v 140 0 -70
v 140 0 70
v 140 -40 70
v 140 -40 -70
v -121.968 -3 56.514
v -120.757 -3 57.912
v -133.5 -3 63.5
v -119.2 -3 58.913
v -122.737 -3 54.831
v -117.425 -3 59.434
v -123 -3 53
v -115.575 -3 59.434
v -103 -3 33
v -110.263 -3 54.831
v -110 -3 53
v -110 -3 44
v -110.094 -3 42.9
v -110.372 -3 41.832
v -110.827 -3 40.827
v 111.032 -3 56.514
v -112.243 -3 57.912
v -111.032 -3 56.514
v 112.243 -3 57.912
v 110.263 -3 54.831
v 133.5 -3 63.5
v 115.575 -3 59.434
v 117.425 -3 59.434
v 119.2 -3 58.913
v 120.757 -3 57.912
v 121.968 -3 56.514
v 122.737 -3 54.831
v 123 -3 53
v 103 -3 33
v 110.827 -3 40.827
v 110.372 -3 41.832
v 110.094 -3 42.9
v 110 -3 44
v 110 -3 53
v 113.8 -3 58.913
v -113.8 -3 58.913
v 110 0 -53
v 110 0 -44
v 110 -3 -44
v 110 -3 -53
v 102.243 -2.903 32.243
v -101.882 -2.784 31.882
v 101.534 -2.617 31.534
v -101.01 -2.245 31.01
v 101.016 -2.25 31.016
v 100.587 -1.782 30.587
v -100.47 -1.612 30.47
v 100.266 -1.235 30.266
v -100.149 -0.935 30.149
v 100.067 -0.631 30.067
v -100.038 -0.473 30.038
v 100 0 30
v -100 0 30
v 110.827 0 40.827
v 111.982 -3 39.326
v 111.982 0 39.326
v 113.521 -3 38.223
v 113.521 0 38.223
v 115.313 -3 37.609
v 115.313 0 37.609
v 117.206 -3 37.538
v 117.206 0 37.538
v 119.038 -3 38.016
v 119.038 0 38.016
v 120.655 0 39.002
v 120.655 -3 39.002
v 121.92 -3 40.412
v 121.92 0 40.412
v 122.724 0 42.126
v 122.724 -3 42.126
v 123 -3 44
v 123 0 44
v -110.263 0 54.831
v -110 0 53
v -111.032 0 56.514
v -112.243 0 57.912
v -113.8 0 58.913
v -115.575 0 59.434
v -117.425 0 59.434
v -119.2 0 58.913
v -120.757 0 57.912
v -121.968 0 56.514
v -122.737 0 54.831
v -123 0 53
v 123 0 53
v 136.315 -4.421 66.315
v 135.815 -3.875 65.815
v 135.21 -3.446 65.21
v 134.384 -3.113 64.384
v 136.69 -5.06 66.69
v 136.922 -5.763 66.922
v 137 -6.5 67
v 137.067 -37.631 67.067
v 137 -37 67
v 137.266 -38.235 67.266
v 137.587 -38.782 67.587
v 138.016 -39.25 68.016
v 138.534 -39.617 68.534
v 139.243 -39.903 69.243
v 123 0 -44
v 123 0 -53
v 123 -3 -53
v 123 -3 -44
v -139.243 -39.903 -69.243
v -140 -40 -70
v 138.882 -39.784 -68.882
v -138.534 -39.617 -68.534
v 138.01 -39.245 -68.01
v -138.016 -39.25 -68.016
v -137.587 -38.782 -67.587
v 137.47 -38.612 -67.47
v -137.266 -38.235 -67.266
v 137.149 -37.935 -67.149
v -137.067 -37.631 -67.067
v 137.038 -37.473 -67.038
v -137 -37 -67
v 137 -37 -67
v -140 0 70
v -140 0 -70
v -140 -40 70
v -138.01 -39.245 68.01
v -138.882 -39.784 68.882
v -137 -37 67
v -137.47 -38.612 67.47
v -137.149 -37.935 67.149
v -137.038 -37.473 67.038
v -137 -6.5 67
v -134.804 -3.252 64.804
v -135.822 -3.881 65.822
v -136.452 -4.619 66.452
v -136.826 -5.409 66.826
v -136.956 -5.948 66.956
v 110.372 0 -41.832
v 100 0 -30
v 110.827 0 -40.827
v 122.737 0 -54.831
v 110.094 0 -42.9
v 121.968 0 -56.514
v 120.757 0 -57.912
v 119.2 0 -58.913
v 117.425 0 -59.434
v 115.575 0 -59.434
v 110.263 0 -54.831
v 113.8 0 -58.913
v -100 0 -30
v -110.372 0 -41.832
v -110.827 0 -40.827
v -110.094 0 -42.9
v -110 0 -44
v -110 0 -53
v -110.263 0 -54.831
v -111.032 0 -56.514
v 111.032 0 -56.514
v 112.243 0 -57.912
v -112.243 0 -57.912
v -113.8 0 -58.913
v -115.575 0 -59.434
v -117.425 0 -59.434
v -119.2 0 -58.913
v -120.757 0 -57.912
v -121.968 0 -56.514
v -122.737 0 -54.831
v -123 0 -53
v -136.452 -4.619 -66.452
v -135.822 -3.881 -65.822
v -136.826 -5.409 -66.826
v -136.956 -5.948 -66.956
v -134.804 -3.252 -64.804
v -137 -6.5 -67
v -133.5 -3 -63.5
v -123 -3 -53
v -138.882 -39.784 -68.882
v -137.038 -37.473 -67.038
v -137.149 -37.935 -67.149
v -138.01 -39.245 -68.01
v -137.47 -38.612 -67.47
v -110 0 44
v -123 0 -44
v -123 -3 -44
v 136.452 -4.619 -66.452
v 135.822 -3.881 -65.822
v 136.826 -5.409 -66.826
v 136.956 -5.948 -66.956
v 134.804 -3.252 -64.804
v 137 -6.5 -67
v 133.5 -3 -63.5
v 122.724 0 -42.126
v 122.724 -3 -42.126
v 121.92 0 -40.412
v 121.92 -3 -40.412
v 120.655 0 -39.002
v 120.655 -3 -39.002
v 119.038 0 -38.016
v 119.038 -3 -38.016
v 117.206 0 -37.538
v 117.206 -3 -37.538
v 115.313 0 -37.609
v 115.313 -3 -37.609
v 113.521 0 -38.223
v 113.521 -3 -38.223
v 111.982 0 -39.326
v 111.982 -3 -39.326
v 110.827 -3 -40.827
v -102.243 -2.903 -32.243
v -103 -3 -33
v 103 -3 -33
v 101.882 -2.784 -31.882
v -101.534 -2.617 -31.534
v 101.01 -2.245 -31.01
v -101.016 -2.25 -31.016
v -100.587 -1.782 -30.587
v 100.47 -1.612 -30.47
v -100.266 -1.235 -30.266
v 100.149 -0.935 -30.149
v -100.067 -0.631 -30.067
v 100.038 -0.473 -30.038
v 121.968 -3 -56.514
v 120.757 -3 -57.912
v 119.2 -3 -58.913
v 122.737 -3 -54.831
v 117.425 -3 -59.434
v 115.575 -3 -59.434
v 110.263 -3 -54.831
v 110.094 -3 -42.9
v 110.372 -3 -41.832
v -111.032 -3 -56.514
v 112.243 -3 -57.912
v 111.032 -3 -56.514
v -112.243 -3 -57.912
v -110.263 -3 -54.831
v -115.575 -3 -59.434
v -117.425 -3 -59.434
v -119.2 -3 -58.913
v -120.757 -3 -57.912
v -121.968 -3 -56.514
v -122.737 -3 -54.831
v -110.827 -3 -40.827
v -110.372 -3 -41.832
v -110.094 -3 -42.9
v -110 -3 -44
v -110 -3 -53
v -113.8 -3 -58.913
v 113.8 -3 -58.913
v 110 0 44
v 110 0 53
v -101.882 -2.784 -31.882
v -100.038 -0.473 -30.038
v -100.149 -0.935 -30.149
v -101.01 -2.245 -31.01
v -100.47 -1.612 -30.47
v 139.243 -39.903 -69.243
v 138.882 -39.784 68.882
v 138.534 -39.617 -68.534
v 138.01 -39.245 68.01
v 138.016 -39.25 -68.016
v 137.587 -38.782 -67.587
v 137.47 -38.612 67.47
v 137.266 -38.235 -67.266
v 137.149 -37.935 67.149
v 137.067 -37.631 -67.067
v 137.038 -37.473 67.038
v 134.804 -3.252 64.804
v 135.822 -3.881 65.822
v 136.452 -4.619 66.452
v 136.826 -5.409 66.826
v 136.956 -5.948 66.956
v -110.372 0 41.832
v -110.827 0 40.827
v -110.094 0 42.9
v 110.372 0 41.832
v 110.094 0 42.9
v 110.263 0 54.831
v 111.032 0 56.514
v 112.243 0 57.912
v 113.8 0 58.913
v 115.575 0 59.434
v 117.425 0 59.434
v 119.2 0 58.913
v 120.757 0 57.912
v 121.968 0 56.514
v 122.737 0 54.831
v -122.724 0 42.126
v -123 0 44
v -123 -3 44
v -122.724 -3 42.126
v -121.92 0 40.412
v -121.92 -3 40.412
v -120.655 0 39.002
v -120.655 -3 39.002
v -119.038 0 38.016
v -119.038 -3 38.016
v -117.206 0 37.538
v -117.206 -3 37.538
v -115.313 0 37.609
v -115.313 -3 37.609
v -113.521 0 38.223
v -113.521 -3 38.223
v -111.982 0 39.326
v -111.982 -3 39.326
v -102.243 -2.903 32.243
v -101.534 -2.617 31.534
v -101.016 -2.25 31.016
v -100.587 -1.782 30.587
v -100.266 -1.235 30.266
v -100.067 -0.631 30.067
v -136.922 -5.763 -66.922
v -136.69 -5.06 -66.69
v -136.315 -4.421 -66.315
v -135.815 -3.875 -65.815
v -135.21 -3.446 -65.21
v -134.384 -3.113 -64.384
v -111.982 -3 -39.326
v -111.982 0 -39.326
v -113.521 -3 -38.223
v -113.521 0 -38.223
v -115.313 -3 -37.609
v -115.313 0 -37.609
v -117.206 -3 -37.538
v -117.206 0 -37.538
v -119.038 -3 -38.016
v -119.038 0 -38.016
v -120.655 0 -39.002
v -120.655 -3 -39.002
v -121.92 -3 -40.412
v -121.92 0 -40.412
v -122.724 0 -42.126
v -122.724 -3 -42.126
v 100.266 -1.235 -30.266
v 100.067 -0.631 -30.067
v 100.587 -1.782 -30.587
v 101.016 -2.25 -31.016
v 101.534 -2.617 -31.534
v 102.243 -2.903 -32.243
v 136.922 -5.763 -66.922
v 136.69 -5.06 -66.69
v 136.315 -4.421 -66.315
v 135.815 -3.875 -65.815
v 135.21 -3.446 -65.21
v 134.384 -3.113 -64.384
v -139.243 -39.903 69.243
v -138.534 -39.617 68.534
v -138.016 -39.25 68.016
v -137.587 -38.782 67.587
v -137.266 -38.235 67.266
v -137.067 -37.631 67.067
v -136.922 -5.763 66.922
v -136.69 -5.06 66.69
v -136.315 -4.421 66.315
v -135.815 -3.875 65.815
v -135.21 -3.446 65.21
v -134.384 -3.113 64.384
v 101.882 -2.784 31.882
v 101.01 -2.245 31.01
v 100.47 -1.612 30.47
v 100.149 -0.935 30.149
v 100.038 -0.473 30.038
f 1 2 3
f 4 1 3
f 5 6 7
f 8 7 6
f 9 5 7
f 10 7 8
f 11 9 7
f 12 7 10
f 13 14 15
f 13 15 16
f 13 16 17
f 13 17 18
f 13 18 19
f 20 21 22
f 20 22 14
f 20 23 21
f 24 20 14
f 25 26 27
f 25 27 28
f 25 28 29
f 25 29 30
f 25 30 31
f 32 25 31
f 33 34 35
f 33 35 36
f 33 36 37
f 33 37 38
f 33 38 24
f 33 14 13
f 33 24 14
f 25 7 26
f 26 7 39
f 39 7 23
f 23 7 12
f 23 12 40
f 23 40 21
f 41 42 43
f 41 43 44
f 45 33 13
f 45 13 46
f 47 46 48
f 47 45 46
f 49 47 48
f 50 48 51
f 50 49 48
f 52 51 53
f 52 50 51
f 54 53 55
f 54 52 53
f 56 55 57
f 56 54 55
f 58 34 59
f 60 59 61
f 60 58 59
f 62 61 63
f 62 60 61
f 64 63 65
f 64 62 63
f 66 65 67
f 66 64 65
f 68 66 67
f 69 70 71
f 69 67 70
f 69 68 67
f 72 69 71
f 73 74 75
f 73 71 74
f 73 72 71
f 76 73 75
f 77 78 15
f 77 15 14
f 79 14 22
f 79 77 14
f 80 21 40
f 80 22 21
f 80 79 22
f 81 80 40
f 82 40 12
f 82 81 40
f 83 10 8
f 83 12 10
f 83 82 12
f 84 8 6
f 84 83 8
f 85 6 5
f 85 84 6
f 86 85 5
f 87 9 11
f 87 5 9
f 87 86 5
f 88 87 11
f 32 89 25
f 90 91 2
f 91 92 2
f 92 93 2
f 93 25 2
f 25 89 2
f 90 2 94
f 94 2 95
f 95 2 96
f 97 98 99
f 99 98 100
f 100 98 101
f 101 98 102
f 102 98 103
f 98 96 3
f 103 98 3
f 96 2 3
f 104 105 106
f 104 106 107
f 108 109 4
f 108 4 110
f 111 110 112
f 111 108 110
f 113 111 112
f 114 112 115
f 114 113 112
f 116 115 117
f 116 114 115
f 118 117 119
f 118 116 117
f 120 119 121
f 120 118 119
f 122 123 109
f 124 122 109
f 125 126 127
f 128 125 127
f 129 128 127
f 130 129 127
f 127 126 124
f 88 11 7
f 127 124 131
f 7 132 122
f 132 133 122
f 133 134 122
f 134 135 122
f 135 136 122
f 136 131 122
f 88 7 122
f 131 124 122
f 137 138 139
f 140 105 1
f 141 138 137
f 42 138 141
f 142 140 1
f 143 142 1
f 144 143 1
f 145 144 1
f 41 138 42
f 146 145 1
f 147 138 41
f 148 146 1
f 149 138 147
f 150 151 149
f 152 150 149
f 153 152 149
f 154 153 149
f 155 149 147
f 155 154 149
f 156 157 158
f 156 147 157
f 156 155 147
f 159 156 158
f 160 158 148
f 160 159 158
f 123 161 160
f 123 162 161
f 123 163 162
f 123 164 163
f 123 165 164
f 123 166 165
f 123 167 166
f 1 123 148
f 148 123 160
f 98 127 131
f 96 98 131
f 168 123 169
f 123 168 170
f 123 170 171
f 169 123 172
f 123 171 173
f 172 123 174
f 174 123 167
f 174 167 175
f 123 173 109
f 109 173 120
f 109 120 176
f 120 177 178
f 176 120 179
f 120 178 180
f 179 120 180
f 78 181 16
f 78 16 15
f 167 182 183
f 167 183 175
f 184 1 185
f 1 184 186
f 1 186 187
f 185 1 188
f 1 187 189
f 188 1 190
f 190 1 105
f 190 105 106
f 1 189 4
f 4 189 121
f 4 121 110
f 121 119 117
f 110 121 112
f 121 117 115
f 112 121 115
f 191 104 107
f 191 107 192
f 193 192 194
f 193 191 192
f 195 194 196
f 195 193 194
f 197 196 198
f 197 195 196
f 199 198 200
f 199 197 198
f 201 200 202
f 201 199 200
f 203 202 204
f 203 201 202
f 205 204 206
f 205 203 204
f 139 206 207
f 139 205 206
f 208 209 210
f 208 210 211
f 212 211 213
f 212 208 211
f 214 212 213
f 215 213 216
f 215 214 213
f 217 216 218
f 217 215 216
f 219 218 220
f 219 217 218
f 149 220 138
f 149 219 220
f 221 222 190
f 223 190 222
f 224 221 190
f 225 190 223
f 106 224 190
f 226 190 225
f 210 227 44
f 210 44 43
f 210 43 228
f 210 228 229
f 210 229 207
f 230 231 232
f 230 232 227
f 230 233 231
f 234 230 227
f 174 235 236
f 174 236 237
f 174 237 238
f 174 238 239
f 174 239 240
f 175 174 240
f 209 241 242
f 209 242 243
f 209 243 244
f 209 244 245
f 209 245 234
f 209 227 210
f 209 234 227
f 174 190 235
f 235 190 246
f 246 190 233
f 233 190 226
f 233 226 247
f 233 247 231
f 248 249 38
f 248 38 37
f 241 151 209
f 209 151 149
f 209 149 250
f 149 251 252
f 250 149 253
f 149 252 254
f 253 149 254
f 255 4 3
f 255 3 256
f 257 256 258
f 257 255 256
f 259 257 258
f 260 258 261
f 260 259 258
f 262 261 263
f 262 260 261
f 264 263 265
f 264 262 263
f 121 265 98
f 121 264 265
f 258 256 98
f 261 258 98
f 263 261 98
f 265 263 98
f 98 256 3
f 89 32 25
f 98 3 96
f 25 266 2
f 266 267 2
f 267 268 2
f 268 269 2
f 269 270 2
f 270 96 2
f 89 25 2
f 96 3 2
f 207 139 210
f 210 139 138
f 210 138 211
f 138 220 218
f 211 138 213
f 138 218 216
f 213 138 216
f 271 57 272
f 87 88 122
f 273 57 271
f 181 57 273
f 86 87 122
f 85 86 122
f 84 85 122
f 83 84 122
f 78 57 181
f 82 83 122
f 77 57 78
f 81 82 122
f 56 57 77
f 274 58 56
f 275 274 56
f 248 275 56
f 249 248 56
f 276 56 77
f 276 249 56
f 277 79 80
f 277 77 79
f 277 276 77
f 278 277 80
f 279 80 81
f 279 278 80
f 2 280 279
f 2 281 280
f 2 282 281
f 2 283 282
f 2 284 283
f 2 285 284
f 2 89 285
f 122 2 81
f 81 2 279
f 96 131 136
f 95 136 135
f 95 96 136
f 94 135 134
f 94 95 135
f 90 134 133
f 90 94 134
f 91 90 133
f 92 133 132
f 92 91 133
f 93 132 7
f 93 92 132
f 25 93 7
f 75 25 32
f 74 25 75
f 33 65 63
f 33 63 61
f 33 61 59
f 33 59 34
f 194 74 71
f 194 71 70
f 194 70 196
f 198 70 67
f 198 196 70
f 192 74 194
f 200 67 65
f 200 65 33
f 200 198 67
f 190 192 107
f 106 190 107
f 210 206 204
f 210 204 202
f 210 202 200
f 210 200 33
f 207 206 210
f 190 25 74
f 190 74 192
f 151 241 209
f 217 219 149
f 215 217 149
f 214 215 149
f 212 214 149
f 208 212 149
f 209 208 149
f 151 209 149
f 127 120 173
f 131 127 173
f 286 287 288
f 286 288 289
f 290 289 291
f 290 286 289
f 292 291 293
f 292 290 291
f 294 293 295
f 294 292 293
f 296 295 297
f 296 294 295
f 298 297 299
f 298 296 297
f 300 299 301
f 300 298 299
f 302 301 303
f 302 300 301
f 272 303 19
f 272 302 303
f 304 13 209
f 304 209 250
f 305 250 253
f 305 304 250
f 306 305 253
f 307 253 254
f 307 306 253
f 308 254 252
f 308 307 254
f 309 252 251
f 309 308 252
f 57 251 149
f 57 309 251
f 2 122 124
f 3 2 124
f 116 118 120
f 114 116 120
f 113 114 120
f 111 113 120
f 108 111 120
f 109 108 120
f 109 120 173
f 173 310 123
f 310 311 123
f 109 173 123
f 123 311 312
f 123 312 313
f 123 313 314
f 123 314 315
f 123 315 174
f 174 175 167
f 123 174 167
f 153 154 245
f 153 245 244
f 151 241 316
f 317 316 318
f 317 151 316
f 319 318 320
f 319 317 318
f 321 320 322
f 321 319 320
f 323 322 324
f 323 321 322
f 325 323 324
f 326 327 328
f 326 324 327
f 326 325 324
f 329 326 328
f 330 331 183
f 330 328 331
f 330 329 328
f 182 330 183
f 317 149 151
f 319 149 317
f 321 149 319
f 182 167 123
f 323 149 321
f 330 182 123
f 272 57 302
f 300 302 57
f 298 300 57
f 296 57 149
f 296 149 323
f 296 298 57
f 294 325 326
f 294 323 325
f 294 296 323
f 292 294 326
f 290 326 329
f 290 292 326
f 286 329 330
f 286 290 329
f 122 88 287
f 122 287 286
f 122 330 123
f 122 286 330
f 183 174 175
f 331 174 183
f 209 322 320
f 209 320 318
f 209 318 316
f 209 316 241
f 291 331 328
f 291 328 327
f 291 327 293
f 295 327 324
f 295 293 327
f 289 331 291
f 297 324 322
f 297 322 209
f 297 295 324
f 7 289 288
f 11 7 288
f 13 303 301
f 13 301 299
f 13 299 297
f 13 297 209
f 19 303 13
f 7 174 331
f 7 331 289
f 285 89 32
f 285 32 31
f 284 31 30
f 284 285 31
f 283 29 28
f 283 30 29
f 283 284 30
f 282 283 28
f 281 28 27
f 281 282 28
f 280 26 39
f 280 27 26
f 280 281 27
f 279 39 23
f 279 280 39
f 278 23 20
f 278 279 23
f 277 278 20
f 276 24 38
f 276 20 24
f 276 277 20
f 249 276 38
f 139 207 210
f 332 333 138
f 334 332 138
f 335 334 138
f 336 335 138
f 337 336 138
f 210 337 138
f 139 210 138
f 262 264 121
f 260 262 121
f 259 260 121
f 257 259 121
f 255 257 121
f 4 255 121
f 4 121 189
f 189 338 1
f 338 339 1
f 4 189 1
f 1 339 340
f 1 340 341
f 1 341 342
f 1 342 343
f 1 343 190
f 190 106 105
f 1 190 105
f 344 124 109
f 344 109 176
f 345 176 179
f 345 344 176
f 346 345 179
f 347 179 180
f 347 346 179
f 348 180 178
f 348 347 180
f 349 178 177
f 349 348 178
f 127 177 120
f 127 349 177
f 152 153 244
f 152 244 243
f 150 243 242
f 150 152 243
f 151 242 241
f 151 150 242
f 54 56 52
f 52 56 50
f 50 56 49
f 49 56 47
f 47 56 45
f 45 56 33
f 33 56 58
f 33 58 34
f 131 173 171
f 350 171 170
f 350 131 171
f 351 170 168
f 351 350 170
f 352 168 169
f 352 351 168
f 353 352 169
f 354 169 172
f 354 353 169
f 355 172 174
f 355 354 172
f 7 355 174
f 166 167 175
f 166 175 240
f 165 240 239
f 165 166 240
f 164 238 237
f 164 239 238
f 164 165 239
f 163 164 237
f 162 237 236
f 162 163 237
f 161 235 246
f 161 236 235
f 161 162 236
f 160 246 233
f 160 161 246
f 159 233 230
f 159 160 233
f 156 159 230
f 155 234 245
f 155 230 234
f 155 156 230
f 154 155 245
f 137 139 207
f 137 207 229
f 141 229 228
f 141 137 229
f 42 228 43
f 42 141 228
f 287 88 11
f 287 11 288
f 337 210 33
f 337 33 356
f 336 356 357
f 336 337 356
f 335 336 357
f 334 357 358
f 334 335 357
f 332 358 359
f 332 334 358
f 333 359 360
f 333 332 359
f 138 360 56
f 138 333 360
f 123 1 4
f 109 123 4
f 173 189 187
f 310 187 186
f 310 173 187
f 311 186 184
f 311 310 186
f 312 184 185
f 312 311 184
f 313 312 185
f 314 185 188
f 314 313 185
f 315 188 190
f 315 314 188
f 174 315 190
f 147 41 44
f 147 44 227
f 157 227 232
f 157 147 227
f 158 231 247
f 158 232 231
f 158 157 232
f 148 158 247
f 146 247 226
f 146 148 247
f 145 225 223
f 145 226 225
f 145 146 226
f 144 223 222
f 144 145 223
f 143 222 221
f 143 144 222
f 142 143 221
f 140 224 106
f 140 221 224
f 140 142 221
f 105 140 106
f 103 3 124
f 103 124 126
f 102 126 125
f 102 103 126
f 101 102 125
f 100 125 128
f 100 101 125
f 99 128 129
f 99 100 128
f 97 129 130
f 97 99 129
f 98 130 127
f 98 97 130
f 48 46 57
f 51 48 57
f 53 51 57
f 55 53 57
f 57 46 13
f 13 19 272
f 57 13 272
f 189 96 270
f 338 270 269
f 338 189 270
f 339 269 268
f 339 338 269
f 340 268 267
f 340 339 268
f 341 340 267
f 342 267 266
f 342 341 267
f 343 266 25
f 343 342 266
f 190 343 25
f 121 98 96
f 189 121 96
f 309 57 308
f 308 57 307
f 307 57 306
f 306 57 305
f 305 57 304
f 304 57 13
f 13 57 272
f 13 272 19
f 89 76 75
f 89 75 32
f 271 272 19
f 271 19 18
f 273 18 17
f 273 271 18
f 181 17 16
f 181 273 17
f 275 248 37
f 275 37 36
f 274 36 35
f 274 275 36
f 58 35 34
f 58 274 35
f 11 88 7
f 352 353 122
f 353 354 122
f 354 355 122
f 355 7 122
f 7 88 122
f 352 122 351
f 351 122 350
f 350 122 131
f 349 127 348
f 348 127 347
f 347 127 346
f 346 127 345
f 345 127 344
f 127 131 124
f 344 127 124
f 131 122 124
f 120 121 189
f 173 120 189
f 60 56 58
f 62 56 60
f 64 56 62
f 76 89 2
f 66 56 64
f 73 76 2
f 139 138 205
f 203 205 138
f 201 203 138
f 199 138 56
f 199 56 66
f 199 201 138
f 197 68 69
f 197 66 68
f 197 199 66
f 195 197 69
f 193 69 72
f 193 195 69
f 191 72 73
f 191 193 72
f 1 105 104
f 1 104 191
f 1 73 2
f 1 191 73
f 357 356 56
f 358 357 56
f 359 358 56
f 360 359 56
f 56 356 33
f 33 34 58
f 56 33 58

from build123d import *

# Parameters (mm, degrees)
IRON_V40X40X3_1_DEPTH      = 197.568542495
IRON_V40X40X3_1_DEPTH_BACK = 57.568542495
IRON_V40X40X3_1_2_DEPTH    = 395.13708499
IRON_V40X40X3_1_3_DEPTH    = 255.13708499
IRON_V40X40X3_1_4_DEPTH    = 395.13708499
CUT_EXTRUDE1_START         = 5
CUT_EXTRUDE1_DEPTH         = 10


with BuildPart() as part:
    # Sketch1 → Iron V40X40X3(1) (new, two sides: drawn at the far end of the back side and taken through both)
    with BuildSketch(Plane(origin=(-140, 0, 70), x_dir=(1, 0, 0), z_dir=(0, 0, -1)).offset(-IRON_V40X40X3_1_DEPTH_BACK)):
        with BuildLine():
            Line((0, 0), (0, 40))
            ThreePointArc((0, 40), (2.121320344, 39.121320344), (3, 37))
            Line((3, 37), (3, 6.5))
            ThreePointArc((3, 6.5), (4.025126266, 4.025126266), (6.5, 3))
            Line((6.5, 3), (37, 3))
            ThreePointArc((37, 3), (39.121320344, 2.121320344), (40, 0))
            Line((40, 0), (0, 0))
        make_face()
    extrude(amount=IRON_V40X40X3_1_DEPTH + IRON_V40X40X3_1_DEPTH_BACK)

    # Iron V40X40X3(1) mitre 1
    split(bisect_by=Plane(origin=(-140, 0, 70), x_dir=(0, -1, 0), z_dir=(-0.707106781, 0, -0.707106781)), keep=Keep.TOP)

    # Iron V40X40X3(1) mitre 2
    split(bisect_by=Plane(origin=(-140, 0, -70), x_dir=(0, -1, 0), z_dir=(-0.707106781, 0, 0.707106781)), keep=Keep.TOP)


with BuildPart() as body_2:
    # Sketch1 on segment 2 (carried to segment 2) → Iron V40X40X3_1 2 (new body)
    with BuildSketch(Plane(origin=(-197.568542495, 0, -70), x_dir=(0, 0, 1), z_dir=(1, 0, 0))):
        with BuildLine():
            Line((0, 0), (0, 40))
            ThreePointArc((0, 40), (2.121320344, 39.121320344), (3, 37))
            Line((3, 37), (3, 6.5))
            ThreePointArc((3, 6.5), (4.025126266, 4.025126266), (6.5, 3))
            Line((6.5, 3), (37, 3))
            ThreePointArc((37, 3), (39.121320344, 2.121320344), (40, 0))
            Line((40, 0), (0, 0))
        make_face()
    extrude(amount=IRON_V40X40X3_1_2_DEPTH)

    # Iron V40X40X3_1 2 mitre 1
    split(bisect_by=Plane(origin=(-140, 0, -70), x_dir=(0, 1, 0), z_dir=(0.707106781, 0, -0.707106781)), keep=Keep.TOP)

    # Iron V40X40X3_1 2 mitre 2
    split(bisect_by=Plane(origin=(140, 0, -70), x_dir=(0, -1, 0), z_dir=(-0.707106781, 0, -0.707106781)), keep=Keep.TOP)


with BuildPart() as body_3:
    # Sketch1 on segment 3 (carried to segment 3) → Iron V40X40X3_1 3 (new body)
    with BuildSketch(Plane(origin=(140, 0, -127.568542495), x_dir=(-1, 0, 0), z_dir=(0, 0, 1))):
        with BuildLine():
            Line((0, 0), (0, 40))
            ThreePointArc((0, 40), (2.121320344, 39.121320344), (3, 37))
            Line((3, 37), (3, 6.5))
            ThreePointArc((3, 6.5), (4.025126266, 4.025126266), (6.5, 3))
            Line((6.5, 3), (37, 3))
            ThreePointArc((37, 3), (39.121320344, 2.121320344), (40, 0))
            Line((40, 0), (0, 0))
        make_face()
    extrude(amount=IRON_V40X40X3_1_3_DEPTH)

    # Iron V40X40X3_1 3 mitre 1
    split(bisect_by=Plane(origin=(140, 0, 70), x_dir=(0, 1, 0), z_dir=(0.707106781, 0, -0.707106781)), keep=Keep.TOP)

    # Iron V40X40X3_1 3 mitre 2
    split(bisect_by=Plane(origin=(140, 0, -70), x_dir=(0, 1, 0), z_dir=(0.707106781, 0, 0.707106781)), keep=Keep.TOP)


with BuildPart() as body_4:
    # Sketch1 on segment 4 (carried to segment 4) → Iron V40X40X3_1 4 (new body)
    with BuildSketch(Plane(origin=(197.568542495, 0, 70), x_dir=(0, 0, -1), z_dir=(-1, 0, 0))):
        with BuildLine():
            Line((0, 0), (0, 40))
            ThreePointArc((0, 40), (2.121320344, 39.121320344), (3, 37))
            Line((3, 37), (3, 6.5))
            ThreePointArc((3, 6.5), (4.025126266, 4.025126266), (6.5, 3))
            Line((6.5, 3), (37, 3))
            ThreePointArc((37, 3), (39.121320344, 2.121320344), (40, 0))
            Line((40, 0), (0, 0))
        make_face()
    extrude(amount=IRON_V40X40X3_1_4_DEPTH)

    # Iron V40X40X3_1 4 mitre 1
    split(bisect_by=Plane(origin=(-140, 0, 70), x_dir=(0, 1, 0), z_dir=(0.707106781, 0, 0.707106781)), keep=Keep.TOP)

    # Iron V40X40X3_1 4 mitre 2
    split(bisect_by=Plane(origin=(140, 0, 70), x_dir=(0, -1, 0), z_dir=(-0.707106781, 0, 0.707106781)), keep=Keep.TOP)


with BuildPart() as cut_extrude1_tool:
    # Sketch2 → Cut-Extrude1 (new body)
    with BuildSketch(Plane(origin=(0, 0, 0), x_dir=(1, 0, 0), z_dir=(0, 1, 0)).offset(CUT_EXTRUDE1_START)):
        with BuildLine():
            Line((123, 53), (123, 44))
            ThreePointArc((123, 44), (116.5, 37.5), (110, 44))
            Line((110, 44), (110, 53))
            ThreePointArc((110, 53), (116.5, 59.5), (123, 53))
        make_face()
        with BuildLine():
            Line((-110, 53), (-110, 44))
            ThreePointArc((-110, 44), (-116.5, 37.5), (-123, 44))
            Line((-123, 44), (-123, 53))
            ThreePointArc((-123, 53), (-116.5, 59.5), (-110, 53))
        make_face()
        with BuildLine():
            Line((-110, -44), (-110, -53))
            ThreePointArc((-110, -53), (-116.5, -59.5), (-123, -53))
            Line((-123, -53), (-123, -44))
            ThreePointArc((-123, -44), (-116.5, -37.5), (-110, -44))
        make_face()
        with BuildLine():
            Line((123, -44), (123, -53))
            ThreePointArc((123, -53), (116.5, -59.5), (110, -53))
            Line((110, -53), (110, -44))
            ThreePointArc((110, -44), (116.5, -37.5), (123, -44))
        make_face()
    extrude(amount=-CUT_EXTRUDE1_DEPTH)


with BuildPart() as part_1:
    add(part.part)

    # Cut-Extrude1: cut by cut_extrude1_tool
    add(cut_extrude1_tool.part, mode=Mode.SUBTRACT)


with BuildPart() as body_2_1:
    add(body_2.part)

    # Cut-Extrude1: cut by cut_extrude1_tool
    add(cut_extrude1_tool.part, mode=Mode.SUBTRACT)


with BuildPart() as body_3_1:
    add(body_3.part)

    # Cut-Extrude1: cut by cut_extrude1_tool
    add(cut_extrude1_tool.part, mode=Mode.SUBTRACT)


with BuildPart() as body_4_1:
    add(body_4.part)

    # Cut-Extrude1: cut by cut_extrude1_tool
    add(cut_extrude1_tool.part, mode=Mode.SUBTRACT)


solid = Compound([part_1.part, body_2_1.part, body_3_1.part, body_4_1.part])
